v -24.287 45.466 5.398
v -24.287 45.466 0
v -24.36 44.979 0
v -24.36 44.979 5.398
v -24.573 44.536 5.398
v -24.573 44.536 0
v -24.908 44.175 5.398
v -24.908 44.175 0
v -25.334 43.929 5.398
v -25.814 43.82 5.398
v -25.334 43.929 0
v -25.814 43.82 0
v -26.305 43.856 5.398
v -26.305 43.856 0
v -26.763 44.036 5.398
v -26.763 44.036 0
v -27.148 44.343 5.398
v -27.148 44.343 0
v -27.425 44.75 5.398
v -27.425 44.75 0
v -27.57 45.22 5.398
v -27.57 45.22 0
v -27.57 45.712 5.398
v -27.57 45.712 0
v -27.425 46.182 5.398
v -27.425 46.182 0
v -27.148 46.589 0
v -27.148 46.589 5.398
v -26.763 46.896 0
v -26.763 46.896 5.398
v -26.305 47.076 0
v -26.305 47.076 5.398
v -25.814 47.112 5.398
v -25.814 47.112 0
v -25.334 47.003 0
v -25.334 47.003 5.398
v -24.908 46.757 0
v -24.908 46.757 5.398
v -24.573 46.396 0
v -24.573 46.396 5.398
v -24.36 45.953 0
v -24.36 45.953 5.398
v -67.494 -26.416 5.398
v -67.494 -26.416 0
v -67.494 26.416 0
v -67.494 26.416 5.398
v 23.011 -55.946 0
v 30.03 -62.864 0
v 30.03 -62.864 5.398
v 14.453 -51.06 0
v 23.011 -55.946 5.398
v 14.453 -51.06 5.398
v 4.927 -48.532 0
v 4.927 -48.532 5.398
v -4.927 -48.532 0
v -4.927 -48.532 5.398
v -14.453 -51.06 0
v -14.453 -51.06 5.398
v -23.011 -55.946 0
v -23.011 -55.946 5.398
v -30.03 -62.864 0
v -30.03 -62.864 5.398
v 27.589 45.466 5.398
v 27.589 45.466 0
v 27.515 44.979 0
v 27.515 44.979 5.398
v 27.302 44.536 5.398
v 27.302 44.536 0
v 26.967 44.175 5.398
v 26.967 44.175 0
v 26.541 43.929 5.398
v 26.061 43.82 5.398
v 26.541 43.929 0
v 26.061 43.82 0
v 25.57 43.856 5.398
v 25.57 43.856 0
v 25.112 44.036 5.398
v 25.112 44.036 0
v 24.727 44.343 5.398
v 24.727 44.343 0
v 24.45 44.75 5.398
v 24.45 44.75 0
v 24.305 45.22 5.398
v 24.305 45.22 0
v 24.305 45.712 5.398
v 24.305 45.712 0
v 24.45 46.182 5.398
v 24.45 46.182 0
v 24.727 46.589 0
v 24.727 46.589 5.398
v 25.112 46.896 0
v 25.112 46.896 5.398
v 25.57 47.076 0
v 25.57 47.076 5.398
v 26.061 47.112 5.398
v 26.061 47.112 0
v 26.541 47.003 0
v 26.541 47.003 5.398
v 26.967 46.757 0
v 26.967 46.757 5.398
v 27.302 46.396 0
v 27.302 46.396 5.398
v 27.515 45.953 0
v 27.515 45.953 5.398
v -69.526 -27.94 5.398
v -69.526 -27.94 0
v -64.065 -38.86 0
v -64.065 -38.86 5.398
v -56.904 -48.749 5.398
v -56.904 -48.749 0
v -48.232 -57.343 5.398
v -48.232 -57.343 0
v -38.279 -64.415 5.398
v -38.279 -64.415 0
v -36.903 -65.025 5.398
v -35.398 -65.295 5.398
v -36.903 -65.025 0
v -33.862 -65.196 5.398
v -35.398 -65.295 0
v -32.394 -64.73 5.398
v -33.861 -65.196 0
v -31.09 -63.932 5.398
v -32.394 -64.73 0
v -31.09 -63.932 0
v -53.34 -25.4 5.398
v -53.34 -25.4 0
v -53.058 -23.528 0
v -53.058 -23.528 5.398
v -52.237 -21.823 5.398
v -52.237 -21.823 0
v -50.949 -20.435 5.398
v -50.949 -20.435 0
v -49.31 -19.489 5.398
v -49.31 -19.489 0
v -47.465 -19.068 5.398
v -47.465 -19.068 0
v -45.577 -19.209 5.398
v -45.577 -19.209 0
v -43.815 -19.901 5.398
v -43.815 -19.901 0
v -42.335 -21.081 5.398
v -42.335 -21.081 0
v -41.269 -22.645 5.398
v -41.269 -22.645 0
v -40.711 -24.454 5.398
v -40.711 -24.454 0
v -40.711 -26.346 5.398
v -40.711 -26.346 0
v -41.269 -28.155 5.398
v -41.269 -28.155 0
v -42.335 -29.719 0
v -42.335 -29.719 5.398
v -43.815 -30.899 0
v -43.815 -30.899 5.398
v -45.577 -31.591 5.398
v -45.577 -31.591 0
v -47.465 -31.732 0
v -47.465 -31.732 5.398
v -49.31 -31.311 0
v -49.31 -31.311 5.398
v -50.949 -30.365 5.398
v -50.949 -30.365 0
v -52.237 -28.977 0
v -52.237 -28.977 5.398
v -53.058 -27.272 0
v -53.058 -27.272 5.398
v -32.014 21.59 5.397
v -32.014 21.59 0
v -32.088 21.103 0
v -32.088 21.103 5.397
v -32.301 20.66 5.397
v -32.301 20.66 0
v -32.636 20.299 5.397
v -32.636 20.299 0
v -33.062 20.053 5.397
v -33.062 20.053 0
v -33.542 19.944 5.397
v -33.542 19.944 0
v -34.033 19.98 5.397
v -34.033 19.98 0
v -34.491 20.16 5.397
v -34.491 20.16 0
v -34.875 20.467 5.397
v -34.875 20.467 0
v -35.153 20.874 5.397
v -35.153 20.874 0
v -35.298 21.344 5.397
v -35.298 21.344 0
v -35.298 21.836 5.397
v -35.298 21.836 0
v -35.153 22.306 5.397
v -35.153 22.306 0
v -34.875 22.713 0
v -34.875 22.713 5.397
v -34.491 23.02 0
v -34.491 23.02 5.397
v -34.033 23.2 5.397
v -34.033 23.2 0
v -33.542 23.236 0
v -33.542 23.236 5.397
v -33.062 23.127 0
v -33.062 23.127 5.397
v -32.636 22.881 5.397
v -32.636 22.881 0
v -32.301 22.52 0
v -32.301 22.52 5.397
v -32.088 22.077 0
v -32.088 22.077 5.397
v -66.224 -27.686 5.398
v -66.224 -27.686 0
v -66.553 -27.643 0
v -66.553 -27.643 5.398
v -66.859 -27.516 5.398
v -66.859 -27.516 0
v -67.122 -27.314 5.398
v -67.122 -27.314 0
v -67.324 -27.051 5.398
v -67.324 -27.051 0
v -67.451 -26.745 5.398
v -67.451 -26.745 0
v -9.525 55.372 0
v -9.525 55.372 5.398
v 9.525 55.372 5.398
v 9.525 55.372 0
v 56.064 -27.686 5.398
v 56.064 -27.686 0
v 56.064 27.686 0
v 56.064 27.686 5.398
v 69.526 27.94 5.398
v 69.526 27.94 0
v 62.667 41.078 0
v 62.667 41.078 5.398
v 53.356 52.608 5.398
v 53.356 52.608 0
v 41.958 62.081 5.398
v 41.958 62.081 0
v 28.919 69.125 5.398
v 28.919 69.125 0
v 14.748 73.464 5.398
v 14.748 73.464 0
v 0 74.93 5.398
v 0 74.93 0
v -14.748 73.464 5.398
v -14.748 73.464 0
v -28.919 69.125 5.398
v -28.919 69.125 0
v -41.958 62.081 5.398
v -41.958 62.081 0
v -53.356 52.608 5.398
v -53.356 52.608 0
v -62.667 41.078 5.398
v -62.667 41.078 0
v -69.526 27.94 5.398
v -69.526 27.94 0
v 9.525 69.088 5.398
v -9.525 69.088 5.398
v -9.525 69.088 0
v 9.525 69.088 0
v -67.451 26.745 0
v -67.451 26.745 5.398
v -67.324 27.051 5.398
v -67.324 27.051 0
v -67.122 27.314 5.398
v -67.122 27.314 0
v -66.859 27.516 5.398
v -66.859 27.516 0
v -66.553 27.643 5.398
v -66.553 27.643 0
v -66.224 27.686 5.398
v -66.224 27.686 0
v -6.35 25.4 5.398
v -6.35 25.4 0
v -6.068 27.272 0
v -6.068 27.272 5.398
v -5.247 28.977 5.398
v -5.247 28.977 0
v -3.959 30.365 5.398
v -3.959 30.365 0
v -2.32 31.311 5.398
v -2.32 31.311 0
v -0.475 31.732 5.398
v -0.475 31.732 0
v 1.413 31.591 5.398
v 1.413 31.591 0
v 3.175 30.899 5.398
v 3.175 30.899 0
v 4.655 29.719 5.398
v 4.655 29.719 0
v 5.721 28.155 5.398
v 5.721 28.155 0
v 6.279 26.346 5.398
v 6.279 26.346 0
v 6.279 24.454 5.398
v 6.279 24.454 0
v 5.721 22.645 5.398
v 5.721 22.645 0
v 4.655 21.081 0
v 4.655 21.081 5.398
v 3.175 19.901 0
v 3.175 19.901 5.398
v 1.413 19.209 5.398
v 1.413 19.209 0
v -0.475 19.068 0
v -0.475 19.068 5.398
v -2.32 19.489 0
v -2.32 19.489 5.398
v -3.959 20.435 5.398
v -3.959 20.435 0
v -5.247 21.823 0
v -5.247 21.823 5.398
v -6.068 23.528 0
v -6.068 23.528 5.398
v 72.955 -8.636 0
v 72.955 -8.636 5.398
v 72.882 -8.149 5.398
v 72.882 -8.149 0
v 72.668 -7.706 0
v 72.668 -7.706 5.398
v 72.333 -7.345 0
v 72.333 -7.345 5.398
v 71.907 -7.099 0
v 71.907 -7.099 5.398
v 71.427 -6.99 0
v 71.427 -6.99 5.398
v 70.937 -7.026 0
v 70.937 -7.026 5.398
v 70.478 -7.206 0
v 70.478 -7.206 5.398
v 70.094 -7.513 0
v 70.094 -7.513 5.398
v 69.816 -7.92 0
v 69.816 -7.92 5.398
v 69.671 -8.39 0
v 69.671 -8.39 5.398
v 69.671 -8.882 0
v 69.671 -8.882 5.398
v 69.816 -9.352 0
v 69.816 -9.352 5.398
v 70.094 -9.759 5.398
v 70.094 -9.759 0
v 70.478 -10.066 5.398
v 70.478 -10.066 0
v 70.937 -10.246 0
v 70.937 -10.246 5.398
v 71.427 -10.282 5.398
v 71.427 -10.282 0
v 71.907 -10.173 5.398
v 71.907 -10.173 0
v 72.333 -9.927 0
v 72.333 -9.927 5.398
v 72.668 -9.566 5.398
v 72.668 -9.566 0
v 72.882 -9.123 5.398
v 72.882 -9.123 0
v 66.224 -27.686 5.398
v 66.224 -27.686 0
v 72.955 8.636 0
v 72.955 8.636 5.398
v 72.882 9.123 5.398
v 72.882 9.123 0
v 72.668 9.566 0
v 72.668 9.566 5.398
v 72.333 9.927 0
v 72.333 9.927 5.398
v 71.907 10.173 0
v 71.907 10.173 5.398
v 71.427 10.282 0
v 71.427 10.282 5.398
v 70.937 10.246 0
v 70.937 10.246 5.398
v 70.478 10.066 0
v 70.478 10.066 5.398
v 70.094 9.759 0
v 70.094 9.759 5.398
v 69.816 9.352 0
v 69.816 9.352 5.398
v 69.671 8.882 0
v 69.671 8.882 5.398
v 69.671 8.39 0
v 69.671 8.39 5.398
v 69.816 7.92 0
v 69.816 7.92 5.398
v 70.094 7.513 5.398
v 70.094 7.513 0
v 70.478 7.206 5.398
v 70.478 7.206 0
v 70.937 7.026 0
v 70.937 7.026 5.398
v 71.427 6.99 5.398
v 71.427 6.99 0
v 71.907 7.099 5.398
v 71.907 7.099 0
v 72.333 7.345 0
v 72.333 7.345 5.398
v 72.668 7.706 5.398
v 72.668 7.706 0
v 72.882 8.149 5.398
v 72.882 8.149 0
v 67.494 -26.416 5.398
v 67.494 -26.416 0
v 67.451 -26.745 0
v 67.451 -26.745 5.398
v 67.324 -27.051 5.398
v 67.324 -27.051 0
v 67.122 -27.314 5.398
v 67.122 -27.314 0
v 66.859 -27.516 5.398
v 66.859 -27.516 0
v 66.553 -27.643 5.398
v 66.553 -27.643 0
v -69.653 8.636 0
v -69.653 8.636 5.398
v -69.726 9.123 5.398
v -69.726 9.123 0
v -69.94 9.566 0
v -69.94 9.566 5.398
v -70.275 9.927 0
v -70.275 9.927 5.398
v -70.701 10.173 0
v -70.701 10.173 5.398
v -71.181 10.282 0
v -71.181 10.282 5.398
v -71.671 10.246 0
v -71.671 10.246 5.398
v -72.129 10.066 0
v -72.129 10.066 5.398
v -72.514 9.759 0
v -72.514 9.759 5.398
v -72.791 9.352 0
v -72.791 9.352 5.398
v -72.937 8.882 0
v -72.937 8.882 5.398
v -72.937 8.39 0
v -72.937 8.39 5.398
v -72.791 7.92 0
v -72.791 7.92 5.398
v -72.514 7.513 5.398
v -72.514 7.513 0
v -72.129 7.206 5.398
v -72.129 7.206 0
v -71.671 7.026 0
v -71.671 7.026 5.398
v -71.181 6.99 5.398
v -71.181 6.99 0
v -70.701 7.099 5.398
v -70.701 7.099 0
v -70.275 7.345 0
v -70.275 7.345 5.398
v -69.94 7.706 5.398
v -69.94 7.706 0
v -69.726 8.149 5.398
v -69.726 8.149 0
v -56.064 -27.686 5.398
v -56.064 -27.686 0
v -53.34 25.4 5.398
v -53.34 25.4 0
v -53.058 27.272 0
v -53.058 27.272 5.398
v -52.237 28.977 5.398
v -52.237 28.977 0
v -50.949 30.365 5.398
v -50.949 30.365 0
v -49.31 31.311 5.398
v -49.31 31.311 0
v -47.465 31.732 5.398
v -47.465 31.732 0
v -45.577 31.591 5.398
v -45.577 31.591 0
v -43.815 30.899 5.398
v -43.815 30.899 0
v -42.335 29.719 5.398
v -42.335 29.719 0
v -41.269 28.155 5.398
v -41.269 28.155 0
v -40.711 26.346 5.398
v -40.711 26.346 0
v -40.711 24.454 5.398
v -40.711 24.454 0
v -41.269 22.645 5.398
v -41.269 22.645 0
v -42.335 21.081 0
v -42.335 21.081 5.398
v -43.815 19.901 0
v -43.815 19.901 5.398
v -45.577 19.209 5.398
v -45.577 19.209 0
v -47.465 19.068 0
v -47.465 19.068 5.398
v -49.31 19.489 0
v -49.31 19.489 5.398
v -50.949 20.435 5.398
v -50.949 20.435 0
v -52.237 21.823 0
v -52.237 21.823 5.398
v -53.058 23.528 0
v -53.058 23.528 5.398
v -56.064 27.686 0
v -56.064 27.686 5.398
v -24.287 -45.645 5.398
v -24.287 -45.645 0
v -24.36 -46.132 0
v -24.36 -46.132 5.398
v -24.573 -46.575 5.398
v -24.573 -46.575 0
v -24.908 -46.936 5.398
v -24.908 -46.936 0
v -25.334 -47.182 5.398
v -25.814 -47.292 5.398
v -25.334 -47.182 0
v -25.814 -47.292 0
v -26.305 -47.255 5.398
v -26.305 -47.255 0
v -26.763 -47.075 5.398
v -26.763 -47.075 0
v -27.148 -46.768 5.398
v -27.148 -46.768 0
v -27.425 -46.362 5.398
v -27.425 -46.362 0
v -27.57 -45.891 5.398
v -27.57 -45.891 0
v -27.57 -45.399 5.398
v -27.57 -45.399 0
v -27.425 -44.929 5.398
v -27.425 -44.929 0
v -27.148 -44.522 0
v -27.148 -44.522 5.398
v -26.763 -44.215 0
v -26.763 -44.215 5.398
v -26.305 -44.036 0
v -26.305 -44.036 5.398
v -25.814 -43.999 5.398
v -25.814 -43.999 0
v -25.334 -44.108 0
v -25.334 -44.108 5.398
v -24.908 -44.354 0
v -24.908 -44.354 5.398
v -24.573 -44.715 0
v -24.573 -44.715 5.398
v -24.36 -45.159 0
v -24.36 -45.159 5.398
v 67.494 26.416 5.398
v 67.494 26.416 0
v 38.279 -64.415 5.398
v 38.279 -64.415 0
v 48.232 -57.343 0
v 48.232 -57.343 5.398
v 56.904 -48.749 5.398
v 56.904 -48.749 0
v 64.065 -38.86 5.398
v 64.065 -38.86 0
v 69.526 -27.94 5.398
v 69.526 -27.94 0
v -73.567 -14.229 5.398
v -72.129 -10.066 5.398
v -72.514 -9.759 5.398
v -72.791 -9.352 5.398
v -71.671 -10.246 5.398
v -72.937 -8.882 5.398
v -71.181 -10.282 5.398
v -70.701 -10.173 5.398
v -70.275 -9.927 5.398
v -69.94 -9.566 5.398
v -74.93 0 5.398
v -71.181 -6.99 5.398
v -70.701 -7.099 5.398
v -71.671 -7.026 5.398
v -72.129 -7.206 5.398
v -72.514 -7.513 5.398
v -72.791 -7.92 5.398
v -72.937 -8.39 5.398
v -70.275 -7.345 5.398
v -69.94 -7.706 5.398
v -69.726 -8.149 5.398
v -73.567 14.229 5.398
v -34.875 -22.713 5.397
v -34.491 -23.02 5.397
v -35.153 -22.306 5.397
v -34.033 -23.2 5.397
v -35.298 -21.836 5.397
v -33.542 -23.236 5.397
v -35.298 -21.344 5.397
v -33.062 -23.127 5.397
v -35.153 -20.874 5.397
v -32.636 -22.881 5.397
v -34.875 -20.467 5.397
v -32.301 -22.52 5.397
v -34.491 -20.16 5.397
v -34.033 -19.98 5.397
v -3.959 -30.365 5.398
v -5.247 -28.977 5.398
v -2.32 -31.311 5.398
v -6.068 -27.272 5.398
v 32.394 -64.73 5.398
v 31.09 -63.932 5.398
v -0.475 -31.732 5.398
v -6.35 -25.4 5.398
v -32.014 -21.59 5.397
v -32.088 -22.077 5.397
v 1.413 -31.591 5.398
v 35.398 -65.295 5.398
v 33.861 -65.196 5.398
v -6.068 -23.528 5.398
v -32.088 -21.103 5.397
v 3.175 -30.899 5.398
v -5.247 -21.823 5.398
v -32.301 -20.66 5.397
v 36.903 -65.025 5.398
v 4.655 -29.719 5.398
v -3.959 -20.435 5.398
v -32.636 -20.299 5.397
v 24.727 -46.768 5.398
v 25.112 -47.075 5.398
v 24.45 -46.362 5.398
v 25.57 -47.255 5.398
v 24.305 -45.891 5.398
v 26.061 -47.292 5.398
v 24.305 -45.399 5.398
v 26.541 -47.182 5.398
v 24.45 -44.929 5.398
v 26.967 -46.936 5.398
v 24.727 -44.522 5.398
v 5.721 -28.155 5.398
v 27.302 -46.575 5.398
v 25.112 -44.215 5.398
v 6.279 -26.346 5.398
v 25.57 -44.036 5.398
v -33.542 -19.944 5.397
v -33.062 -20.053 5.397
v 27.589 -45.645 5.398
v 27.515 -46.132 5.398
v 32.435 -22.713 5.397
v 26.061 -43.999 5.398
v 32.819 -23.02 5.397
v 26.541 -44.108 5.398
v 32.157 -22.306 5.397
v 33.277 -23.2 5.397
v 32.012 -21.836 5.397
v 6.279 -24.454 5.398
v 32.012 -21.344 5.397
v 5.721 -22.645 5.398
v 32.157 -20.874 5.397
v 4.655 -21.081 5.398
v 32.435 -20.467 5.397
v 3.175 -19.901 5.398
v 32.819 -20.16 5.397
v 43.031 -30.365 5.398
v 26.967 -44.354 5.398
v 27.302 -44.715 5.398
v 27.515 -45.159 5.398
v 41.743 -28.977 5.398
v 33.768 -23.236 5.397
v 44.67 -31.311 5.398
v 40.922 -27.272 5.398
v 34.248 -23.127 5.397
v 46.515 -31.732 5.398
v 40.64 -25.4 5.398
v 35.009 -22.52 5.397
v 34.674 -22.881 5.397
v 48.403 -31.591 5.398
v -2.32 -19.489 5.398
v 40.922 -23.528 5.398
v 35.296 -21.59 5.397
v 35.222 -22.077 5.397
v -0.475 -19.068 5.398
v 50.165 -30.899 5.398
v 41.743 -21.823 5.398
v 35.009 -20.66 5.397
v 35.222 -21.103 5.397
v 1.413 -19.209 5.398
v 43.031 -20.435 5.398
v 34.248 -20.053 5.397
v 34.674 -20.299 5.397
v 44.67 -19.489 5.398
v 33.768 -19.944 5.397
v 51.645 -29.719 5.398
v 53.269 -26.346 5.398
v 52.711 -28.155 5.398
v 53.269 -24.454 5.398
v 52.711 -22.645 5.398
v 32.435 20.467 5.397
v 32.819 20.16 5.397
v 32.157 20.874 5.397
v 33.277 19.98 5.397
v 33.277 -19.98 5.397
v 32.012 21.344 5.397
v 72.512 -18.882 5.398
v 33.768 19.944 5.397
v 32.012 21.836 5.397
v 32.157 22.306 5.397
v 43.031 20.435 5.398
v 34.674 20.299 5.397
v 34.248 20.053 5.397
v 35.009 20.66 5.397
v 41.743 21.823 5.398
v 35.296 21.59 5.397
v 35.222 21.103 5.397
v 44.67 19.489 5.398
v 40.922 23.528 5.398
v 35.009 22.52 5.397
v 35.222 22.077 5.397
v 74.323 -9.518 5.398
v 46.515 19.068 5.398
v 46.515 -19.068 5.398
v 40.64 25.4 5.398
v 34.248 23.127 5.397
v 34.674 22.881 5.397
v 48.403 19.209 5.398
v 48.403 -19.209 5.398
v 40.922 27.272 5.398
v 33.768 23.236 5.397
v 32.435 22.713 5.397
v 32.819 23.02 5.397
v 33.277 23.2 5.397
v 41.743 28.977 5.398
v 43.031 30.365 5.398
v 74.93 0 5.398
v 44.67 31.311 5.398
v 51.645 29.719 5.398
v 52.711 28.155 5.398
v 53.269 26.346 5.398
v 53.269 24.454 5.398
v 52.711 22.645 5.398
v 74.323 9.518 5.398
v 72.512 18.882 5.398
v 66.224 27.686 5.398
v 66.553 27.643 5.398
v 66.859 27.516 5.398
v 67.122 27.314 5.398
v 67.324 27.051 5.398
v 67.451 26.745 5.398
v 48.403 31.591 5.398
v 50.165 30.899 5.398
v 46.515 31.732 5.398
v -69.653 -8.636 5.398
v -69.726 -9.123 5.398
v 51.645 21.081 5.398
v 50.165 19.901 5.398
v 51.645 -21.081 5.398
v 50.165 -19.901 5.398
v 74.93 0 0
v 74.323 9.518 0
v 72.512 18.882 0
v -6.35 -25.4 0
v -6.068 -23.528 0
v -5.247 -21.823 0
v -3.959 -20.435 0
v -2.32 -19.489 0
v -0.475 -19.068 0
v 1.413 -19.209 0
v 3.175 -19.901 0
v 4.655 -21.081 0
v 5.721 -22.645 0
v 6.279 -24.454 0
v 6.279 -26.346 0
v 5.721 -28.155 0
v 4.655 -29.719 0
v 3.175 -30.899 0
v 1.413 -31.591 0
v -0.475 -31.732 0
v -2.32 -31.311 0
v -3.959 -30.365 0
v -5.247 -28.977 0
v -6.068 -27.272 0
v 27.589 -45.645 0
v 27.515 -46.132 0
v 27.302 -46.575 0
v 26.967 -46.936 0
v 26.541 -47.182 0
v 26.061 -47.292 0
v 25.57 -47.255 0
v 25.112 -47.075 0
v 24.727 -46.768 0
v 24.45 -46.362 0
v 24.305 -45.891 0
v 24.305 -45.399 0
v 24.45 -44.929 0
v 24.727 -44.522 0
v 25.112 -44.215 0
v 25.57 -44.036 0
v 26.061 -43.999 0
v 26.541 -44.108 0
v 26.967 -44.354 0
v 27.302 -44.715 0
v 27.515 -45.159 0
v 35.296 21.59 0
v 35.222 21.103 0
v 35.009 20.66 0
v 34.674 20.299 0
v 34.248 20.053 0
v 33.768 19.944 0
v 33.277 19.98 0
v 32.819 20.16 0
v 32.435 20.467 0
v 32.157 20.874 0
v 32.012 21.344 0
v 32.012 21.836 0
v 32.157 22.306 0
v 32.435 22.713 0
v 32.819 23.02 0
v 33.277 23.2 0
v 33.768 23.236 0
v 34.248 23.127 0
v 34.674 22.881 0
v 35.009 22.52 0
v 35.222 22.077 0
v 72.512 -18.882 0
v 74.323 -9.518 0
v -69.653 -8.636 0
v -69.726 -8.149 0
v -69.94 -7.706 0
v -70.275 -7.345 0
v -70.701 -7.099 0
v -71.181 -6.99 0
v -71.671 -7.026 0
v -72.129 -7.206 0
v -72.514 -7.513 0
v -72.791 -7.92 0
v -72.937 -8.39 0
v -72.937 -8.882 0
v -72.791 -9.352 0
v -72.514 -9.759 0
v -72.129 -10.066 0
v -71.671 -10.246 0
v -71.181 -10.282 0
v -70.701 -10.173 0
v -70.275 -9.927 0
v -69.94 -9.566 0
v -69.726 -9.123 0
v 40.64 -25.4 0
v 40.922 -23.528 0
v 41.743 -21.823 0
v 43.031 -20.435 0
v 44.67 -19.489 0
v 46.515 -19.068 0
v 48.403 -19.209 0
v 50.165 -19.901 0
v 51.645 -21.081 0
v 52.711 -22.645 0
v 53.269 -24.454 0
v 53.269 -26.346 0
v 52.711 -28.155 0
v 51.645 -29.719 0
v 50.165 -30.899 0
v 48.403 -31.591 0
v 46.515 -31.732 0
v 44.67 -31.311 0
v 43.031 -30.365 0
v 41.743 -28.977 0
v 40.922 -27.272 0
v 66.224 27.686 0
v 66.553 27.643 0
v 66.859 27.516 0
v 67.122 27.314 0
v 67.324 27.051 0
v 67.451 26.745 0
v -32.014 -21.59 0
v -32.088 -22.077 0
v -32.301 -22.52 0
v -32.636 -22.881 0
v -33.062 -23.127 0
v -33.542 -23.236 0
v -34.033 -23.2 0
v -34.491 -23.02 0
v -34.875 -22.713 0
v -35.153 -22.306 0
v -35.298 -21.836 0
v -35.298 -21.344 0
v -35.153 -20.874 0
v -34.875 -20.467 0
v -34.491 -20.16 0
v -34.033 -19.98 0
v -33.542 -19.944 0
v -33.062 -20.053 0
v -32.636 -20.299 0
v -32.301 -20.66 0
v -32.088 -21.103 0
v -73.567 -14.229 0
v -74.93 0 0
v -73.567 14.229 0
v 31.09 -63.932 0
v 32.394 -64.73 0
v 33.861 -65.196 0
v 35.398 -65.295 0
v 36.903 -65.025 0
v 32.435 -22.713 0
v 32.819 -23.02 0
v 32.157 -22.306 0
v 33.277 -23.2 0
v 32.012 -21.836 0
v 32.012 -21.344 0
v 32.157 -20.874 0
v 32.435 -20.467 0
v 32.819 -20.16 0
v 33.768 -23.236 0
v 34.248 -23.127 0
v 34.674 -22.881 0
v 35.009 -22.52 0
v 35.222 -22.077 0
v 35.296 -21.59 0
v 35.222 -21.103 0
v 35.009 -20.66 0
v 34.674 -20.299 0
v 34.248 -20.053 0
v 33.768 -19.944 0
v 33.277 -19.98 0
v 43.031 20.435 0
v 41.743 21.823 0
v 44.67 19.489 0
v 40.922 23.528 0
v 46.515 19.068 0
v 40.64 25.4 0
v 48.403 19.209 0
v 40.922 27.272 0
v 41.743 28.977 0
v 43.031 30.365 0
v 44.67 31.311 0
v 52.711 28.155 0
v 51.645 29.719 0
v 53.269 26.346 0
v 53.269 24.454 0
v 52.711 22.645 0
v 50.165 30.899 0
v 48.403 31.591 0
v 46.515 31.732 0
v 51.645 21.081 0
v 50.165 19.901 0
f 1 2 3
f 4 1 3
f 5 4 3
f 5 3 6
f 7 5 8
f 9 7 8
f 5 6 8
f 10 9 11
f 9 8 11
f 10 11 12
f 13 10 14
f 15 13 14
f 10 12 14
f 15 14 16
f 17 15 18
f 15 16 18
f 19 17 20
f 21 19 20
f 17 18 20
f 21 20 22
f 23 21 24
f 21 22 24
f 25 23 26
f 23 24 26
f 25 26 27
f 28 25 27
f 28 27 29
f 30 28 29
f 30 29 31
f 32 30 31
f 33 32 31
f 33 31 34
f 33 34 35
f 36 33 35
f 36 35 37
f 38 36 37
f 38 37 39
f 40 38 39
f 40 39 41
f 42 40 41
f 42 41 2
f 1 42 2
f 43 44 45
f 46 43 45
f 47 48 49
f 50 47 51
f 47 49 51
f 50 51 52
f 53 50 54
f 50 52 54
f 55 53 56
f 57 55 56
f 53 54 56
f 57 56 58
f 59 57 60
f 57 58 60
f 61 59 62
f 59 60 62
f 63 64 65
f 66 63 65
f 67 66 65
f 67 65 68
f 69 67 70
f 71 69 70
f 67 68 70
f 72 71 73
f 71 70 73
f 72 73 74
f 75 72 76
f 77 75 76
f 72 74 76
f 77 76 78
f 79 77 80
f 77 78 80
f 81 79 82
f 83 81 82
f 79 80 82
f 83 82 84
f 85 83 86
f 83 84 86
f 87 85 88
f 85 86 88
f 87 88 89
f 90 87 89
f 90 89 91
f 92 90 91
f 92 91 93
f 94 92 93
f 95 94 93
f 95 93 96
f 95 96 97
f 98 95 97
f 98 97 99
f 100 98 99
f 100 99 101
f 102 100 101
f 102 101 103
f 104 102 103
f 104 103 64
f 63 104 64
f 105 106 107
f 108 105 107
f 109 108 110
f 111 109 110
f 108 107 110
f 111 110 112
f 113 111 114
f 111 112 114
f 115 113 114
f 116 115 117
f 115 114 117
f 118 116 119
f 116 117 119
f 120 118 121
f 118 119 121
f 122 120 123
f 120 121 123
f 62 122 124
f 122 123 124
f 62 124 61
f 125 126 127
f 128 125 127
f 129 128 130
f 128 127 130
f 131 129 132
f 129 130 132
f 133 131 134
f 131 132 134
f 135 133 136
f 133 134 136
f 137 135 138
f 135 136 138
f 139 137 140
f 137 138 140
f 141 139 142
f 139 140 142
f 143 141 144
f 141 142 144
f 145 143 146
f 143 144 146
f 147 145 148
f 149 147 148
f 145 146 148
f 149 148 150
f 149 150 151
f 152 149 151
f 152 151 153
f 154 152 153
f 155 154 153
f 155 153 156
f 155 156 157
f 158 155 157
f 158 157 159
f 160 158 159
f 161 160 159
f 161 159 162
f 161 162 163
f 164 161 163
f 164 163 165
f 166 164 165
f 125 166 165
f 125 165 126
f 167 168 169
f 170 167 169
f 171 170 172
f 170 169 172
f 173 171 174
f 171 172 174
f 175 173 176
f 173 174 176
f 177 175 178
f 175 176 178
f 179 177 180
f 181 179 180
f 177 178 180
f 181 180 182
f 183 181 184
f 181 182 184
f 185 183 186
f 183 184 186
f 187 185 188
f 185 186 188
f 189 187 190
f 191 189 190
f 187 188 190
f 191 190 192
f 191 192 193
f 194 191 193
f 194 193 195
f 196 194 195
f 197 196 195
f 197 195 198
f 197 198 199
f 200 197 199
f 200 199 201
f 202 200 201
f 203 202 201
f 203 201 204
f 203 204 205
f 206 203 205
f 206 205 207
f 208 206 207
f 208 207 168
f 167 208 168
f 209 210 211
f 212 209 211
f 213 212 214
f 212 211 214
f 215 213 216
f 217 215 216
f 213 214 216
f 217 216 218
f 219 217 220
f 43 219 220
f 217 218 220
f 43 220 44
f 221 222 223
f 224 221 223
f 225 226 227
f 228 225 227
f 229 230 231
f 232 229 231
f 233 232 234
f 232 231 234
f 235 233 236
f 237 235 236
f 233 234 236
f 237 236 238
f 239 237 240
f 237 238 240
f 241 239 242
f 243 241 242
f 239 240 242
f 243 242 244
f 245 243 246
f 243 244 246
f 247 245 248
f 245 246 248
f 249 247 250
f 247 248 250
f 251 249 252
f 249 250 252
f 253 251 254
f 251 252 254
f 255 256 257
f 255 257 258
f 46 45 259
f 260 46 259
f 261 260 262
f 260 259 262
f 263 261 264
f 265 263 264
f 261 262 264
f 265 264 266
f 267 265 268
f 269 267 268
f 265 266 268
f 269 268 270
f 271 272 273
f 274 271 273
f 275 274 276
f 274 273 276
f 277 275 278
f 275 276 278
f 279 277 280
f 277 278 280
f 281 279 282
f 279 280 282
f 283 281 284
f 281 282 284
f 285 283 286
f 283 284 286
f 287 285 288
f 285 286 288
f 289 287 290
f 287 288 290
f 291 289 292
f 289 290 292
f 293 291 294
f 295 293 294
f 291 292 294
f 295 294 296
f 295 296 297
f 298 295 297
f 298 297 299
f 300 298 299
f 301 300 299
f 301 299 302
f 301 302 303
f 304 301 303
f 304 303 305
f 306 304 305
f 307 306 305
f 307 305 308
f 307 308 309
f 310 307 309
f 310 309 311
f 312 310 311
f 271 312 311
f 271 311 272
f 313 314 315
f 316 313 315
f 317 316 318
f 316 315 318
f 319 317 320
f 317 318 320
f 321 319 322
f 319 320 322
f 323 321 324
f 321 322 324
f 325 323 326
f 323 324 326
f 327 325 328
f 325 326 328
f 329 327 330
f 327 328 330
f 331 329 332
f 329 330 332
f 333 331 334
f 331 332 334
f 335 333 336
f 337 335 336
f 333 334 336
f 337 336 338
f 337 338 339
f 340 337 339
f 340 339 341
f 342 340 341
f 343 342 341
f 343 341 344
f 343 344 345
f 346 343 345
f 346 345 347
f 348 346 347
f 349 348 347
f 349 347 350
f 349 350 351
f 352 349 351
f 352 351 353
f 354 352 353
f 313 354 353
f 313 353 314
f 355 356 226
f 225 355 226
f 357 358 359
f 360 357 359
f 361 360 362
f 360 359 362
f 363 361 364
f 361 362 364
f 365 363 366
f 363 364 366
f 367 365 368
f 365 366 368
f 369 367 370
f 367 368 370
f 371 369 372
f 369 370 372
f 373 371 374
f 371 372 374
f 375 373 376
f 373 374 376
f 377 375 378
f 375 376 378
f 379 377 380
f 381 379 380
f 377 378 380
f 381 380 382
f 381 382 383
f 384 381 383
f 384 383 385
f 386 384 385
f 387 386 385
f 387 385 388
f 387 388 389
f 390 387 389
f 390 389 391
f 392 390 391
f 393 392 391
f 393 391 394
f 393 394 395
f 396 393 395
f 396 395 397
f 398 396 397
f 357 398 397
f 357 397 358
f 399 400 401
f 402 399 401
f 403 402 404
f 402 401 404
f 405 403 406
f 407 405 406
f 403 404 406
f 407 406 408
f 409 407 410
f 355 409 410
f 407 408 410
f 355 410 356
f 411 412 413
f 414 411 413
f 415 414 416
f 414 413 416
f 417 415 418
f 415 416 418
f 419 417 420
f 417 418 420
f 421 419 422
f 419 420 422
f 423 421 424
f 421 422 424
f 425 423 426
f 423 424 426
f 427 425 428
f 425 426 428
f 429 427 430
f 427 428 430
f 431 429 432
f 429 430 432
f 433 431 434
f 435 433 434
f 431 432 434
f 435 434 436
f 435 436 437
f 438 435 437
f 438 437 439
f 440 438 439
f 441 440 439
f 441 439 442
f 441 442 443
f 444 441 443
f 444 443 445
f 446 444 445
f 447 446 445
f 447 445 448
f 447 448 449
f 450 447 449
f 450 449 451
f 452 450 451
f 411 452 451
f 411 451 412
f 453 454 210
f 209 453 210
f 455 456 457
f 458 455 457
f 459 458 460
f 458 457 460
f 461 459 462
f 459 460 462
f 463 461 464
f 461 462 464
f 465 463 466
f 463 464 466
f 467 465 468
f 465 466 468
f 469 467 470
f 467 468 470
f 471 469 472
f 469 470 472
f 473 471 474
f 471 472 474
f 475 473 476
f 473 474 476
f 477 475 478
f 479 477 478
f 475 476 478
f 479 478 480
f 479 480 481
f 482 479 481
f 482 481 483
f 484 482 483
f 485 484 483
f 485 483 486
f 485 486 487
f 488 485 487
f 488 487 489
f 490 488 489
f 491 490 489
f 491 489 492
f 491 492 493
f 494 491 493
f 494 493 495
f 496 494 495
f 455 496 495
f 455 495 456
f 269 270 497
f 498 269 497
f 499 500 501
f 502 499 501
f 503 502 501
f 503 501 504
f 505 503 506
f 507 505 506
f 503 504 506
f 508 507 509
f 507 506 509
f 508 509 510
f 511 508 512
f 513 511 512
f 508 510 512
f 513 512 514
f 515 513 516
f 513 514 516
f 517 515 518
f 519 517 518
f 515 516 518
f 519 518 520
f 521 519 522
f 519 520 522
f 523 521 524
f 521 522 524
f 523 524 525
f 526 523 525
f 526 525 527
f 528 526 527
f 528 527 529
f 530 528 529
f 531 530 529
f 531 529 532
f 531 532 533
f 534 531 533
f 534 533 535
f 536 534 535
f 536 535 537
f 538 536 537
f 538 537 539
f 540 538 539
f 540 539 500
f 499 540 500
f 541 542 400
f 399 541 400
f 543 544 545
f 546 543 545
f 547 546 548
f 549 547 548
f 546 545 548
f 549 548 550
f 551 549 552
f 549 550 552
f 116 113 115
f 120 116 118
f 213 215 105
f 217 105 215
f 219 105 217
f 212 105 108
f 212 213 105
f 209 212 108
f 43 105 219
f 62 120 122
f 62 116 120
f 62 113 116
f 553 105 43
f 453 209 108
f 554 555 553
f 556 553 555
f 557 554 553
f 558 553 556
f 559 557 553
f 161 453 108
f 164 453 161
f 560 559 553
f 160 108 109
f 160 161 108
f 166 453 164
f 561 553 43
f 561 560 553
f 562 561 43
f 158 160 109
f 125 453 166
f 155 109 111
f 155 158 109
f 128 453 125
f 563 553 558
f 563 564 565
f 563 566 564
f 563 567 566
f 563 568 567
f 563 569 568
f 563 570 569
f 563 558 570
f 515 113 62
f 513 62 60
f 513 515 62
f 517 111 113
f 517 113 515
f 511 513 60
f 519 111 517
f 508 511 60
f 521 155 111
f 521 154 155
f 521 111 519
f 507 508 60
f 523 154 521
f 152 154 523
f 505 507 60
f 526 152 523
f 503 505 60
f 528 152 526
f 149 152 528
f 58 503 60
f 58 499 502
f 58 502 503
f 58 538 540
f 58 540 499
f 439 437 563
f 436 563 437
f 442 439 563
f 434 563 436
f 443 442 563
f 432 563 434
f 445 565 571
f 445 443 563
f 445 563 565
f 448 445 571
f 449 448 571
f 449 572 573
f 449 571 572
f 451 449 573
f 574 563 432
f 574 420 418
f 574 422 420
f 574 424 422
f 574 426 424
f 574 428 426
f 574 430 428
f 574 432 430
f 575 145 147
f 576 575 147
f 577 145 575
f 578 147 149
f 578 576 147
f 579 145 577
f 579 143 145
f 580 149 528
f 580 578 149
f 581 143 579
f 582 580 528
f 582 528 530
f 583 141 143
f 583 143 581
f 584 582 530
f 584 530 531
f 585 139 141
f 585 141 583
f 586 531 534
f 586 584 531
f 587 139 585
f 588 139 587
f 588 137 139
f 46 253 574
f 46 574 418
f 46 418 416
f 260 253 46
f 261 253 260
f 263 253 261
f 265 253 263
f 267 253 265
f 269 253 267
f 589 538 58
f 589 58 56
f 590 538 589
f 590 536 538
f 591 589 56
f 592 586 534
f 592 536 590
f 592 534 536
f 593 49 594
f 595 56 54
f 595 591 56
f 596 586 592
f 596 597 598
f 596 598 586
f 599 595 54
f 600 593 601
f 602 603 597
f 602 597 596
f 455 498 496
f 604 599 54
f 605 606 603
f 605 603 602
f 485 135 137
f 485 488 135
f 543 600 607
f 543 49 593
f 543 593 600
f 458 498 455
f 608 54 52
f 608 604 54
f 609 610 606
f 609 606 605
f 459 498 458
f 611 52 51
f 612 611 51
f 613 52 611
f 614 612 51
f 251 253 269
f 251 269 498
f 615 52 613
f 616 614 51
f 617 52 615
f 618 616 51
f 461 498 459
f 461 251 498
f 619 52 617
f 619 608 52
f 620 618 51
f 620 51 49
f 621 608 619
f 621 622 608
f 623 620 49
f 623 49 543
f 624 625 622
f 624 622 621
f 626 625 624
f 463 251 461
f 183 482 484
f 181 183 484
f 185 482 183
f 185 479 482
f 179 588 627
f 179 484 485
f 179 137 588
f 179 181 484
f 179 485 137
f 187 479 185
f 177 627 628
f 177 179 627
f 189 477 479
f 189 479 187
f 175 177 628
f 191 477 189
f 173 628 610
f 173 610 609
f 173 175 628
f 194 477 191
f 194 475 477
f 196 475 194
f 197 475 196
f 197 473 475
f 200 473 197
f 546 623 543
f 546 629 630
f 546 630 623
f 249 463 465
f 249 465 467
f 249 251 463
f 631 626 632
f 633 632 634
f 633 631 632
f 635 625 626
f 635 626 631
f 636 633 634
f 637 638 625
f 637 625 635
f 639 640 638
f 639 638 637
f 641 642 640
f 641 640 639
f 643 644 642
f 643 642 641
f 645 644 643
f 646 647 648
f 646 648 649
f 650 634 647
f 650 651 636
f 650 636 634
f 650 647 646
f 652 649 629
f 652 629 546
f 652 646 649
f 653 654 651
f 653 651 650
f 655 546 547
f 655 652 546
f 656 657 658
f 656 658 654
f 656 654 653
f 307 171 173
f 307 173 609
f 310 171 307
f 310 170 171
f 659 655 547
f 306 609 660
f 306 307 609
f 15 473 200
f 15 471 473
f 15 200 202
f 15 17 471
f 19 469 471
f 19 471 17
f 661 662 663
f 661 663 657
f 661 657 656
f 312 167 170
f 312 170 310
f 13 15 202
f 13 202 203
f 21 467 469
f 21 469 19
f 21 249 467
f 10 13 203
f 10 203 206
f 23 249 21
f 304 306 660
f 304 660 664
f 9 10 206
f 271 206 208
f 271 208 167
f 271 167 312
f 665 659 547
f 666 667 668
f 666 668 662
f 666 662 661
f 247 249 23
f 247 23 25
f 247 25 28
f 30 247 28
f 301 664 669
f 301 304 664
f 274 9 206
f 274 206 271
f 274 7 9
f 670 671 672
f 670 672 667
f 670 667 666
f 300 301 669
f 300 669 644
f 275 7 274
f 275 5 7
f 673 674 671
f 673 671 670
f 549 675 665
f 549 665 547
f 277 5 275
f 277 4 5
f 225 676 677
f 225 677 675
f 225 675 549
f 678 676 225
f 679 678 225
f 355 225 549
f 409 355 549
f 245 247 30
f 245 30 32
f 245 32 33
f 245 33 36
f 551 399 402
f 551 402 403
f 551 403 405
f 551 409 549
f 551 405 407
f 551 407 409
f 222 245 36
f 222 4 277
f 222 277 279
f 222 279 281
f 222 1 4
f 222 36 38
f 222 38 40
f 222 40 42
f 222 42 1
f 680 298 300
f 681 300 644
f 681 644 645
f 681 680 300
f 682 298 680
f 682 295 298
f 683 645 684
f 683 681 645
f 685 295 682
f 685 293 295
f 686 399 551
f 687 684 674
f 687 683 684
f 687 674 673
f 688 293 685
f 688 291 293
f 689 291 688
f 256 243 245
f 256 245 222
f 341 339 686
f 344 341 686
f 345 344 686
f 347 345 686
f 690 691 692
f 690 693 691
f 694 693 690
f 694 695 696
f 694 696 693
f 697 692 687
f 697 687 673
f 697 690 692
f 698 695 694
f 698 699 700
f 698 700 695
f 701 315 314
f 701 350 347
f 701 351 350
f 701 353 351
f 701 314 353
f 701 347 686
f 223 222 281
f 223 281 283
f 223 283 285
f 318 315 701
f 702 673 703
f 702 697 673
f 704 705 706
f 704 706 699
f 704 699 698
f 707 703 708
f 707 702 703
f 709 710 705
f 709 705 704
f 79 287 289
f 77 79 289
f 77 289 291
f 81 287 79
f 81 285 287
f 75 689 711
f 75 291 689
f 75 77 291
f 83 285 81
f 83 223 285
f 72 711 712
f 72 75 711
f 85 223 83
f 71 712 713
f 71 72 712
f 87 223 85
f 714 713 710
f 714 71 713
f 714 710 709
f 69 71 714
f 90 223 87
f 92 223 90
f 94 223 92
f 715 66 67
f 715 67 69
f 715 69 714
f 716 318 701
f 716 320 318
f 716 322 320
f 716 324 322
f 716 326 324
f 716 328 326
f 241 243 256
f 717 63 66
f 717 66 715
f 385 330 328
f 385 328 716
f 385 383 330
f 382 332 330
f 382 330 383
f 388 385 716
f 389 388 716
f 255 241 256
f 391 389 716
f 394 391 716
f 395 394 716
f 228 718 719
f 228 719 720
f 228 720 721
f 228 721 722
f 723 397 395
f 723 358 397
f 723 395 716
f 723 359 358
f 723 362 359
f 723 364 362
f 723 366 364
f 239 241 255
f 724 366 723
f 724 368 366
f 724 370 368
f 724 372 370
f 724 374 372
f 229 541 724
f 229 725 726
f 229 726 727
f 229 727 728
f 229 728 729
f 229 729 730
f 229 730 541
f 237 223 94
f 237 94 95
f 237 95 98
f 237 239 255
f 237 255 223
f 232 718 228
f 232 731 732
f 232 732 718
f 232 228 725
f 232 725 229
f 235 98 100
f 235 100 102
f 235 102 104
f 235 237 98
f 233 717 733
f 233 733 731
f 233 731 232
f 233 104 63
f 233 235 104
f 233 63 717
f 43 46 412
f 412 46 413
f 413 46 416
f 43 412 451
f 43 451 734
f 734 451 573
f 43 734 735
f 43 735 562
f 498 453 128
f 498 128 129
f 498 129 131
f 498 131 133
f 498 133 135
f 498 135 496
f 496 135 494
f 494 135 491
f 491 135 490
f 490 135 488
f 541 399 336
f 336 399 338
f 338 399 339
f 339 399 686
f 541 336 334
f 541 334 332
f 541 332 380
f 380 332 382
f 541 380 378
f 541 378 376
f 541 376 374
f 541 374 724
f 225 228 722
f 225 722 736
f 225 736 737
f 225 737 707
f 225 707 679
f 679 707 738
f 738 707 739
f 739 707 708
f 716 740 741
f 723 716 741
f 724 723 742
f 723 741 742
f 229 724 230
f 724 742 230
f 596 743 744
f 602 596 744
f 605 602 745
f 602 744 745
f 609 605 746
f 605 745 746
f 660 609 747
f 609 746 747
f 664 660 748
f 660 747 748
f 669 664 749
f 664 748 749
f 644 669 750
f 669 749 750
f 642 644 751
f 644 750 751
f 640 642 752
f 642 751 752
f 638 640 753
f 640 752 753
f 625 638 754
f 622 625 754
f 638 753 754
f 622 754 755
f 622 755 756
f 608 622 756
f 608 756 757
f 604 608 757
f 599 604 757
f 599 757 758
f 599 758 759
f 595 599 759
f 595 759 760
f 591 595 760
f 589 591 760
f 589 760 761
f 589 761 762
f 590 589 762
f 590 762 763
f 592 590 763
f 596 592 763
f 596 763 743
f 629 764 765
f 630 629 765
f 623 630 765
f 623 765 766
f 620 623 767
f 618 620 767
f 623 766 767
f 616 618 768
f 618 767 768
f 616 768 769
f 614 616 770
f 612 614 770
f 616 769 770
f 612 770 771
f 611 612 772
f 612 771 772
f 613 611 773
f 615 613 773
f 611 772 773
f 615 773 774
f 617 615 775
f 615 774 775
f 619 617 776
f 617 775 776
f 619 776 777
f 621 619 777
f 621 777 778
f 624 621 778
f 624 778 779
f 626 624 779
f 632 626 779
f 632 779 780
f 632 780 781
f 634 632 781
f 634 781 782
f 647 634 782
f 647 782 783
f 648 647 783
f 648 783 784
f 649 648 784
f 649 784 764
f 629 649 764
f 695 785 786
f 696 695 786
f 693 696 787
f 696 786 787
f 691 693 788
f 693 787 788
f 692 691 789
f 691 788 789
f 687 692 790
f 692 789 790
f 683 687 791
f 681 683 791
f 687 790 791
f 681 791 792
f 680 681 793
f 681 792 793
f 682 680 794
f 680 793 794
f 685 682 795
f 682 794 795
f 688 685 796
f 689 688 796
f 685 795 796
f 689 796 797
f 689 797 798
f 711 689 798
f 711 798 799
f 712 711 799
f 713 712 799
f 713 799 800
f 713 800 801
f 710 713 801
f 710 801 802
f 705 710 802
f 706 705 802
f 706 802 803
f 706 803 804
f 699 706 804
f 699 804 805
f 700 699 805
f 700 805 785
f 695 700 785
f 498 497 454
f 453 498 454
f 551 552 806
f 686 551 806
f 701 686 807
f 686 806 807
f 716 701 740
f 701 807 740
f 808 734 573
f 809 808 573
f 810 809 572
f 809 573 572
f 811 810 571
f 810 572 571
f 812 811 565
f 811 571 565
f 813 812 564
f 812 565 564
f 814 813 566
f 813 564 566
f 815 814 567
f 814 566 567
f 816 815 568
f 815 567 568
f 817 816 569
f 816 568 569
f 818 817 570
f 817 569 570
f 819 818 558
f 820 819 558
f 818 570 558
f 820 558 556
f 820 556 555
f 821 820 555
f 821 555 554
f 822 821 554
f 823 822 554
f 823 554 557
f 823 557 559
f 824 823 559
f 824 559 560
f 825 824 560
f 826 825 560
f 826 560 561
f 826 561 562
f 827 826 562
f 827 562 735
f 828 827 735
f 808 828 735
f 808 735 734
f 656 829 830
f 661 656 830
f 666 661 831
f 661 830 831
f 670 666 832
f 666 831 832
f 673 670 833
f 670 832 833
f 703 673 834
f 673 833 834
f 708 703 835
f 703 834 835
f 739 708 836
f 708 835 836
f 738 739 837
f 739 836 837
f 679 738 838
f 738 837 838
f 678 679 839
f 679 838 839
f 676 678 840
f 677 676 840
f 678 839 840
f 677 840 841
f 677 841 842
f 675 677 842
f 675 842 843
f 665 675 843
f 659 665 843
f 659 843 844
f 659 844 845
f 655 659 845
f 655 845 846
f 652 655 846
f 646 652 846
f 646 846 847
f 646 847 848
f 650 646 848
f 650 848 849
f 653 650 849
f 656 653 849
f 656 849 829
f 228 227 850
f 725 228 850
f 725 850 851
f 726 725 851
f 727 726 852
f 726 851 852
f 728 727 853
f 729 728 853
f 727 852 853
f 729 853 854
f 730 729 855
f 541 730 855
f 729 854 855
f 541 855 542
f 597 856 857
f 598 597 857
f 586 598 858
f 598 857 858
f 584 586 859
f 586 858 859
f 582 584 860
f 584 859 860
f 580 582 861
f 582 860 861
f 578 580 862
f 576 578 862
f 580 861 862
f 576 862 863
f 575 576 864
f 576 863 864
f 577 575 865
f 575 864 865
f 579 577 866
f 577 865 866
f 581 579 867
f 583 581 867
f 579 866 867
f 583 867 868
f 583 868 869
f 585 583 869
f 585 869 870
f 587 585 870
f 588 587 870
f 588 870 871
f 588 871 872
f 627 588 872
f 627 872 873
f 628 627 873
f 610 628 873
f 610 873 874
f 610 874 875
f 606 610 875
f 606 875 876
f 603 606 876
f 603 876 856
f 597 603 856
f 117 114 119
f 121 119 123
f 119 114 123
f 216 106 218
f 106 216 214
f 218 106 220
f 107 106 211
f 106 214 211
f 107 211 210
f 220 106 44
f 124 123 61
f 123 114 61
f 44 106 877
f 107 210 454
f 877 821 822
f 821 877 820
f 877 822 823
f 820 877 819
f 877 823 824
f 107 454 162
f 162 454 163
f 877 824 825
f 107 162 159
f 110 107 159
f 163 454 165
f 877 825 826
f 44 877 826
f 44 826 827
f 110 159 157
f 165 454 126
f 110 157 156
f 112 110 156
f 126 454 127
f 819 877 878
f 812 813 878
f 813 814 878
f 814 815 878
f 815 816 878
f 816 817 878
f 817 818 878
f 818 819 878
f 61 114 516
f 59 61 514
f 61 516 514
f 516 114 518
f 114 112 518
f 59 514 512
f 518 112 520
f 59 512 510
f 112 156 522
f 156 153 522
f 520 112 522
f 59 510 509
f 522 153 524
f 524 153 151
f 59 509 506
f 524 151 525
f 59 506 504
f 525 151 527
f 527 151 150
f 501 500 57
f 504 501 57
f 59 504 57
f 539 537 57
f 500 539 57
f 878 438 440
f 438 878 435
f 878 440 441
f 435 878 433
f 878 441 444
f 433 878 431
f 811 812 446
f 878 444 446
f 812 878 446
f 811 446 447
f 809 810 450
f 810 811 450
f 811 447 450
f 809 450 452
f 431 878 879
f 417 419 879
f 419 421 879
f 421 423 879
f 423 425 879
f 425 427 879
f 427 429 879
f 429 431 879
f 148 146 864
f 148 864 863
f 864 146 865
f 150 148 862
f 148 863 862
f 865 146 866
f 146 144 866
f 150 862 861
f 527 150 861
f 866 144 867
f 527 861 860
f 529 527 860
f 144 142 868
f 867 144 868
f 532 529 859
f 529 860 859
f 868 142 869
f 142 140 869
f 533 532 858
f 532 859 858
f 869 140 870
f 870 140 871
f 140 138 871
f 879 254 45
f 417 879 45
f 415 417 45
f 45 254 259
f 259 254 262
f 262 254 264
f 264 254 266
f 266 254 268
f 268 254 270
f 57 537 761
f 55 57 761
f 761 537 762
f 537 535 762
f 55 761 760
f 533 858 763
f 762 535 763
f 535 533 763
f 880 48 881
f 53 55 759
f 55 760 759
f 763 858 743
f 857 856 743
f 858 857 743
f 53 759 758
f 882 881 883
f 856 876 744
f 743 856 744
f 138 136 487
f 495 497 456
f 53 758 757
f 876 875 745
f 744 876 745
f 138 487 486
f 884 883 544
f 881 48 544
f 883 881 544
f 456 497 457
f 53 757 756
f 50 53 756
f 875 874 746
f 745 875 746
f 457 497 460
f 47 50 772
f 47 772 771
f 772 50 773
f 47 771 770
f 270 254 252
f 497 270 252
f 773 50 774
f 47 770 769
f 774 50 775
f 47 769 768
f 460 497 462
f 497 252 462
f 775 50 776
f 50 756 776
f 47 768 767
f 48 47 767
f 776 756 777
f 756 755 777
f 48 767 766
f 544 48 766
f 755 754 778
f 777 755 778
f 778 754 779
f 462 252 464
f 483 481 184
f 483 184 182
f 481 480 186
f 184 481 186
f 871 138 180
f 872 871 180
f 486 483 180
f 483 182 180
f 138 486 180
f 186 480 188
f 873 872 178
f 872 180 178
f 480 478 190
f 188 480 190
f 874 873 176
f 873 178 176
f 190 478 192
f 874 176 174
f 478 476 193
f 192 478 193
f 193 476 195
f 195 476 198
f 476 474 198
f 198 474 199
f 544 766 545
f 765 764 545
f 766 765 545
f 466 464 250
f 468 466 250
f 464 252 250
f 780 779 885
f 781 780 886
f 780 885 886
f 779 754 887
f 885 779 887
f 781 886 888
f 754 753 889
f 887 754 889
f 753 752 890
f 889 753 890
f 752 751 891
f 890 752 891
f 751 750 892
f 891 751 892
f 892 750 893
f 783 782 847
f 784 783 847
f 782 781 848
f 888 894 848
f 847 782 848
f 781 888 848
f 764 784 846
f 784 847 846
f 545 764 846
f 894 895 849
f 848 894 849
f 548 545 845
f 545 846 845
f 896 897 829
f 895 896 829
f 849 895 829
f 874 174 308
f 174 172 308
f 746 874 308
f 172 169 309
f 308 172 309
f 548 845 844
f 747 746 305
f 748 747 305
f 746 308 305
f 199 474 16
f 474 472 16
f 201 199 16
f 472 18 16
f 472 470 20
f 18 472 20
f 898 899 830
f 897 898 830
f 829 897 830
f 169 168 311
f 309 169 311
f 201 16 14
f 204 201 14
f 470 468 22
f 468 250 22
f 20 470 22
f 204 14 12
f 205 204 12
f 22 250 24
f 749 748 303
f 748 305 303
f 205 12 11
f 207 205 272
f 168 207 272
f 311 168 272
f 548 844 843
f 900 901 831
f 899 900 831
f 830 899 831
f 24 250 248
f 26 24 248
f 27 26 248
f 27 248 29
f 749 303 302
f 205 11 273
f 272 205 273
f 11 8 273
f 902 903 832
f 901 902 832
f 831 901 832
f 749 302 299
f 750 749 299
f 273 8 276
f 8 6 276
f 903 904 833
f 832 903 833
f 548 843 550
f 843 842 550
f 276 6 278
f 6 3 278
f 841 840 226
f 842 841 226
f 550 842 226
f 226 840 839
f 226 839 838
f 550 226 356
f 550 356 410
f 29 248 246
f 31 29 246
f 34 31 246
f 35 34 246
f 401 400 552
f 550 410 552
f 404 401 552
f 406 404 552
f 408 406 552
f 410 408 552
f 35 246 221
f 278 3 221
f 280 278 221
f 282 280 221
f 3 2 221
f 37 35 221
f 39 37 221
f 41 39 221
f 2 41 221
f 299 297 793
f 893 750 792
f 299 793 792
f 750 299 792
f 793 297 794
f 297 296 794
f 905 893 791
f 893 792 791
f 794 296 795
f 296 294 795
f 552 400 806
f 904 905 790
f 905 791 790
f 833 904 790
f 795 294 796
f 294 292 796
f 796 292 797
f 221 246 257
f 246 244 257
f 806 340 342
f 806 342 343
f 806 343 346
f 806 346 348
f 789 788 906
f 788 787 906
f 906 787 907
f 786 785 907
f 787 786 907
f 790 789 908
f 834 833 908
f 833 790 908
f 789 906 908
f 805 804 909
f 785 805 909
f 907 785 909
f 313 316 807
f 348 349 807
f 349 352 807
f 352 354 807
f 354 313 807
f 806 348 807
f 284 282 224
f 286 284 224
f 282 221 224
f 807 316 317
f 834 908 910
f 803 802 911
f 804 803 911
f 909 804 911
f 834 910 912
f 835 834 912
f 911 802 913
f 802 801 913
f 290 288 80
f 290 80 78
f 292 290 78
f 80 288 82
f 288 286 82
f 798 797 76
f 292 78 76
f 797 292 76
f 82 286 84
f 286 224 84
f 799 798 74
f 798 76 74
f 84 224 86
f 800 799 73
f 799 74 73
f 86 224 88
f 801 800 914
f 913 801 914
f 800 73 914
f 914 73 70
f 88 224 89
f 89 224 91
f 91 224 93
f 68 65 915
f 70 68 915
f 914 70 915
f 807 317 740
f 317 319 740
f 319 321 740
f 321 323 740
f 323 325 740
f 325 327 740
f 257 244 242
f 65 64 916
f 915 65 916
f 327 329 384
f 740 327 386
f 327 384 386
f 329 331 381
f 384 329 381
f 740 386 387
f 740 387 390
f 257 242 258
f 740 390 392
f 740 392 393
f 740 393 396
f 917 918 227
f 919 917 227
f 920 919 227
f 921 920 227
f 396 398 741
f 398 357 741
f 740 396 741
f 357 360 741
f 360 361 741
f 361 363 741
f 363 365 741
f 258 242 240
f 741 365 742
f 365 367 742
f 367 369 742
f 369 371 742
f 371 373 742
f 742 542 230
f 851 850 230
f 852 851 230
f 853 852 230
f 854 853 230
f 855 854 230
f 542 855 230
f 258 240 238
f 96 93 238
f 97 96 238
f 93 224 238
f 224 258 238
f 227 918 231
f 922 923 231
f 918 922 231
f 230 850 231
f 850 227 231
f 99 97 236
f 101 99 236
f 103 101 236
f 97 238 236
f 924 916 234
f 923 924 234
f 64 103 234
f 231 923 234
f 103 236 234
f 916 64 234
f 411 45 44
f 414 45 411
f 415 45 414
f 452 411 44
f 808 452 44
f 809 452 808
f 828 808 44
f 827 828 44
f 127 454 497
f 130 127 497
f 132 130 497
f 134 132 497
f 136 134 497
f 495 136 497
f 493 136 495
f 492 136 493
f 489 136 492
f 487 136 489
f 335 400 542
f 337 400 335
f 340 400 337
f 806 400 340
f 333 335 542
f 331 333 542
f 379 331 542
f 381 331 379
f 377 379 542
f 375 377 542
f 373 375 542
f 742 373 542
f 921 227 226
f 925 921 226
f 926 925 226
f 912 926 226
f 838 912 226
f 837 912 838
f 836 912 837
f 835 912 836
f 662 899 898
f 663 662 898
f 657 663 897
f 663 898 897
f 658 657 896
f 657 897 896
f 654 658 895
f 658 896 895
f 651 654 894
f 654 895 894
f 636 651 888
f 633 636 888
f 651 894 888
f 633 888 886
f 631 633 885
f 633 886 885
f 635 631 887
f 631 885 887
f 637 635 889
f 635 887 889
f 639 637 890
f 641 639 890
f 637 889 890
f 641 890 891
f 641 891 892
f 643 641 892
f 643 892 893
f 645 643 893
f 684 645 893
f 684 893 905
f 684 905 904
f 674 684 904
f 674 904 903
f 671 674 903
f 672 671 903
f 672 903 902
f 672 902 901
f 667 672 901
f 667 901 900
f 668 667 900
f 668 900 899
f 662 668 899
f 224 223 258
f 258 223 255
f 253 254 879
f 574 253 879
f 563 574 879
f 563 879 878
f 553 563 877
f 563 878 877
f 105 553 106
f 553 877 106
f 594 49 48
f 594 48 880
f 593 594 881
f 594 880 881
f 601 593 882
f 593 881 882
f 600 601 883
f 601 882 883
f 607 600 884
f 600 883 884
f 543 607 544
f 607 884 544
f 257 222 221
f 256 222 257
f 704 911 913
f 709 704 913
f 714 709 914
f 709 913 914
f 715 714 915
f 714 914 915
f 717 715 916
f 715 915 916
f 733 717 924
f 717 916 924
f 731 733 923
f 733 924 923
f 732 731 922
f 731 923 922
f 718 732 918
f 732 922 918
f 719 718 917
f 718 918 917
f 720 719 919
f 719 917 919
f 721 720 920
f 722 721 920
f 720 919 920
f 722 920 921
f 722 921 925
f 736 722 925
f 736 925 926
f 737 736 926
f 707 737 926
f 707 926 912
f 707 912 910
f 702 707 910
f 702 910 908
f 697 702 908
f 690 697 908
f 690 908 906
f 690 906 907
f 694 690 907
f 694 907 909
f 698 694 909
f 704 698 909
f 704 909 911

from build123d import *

# Parameters (mm, degrees)
BOSS_EXTRUDE2_DEPTH      = 5.3975
SKETCH2_W                = 19.05
SKETCH2_H                = 13.716
CUT_EXTRUDE1_DEPTH       = 107.104395791
SKETCH3_R                = 38.1
CUT_EXTRUDE2_DEPTH       = 107.104395791
FILLET1_R                = 6.35
SKETCH8_R                = 1.651
CUT_EXTRUDE7_DEPTH       = 75.692
SKETCH10_R               = 1.651
CUT_EXTRUDE9_DEPTH       = 97.79
SKETCH11_R               = 1.651
CUT_EXTRUDE10_DEPTH      = 150.876
SKETCH12_R               = 3.175
CUT_EXTRUDE11_DEPTH      = 103.378
CUT_EXTRUDE11_DEPTH_BACK = 48.768
SKETCH13_R               = 6.35
CUT_EXTRUDE12_DEPTH      = 26.416


with BuildPart() as part:
    # Sketch1 → Boss-Extrude2 (new body)
    with BuildSketch(Plane.XY):
        with BuildLine():
            ThreePointArc((-69.525975721, 27.94), (-74.93, 0), (-69.525975721, -27.94))
            ThreePointArc((-69.525975721, -27.94), (0, -74.93), (69.525975721, -27.94))
            ThreePointArc((69.525975721, -27.94), (73.56658977, -14.228906128), (74.93, 0))
            ThreePointArc((74.93, 0), (73.56658977, 14.228906128), (69.525975721, 27.94))
            ThreePointArc((69.525975721, 27.94), (0, 74.93), (-69.525975721, 27.94))
        make_face()
        with BuildLine():
            ThreePointArc((-67.493975721, 26.416), (-67.122001333, 27.314025612), (-66.223975721, 27.686))
            Line((-66.223975721, 27.686), (-56.063975721, 27.686))
            Line((-56.063975721, 27.686), (-56.063975721, -27.686))
            Line((-56.063975721, -27.686), (-66.223975721, -27.686))
            ThreePointArc((-66.223975721, -27.686), (-67.122001333, -27.314025612), (-67.493975721, -26.416))
            Line((-67.493975721, -26.416), (-67.493975721, 26.416))
        make_face(mode=Mode.SUBTRACT)
        with BuildLine():
            ThreePointArc((66.223975721, 27.686), (67.122001333, 27.314025612), (67.493975721, 26.416))
            Line((67.493975721, 26.416), (67.493975721, -26.416))
            ThreePointArc((67.493975721, -26.416), (67.122001333, -27.314025612), (66.223975721, -27.686))
            Line((66.223975721, -27.686), (56.063975721, -27.686))
            Line((56.063975721, -27.686), (56.063975721, 27.686))
            Line((56.063975721, 27.686), (66.223975721, 27.686))
        make_face(mode=Mode.SUBTRACT)
    extrude(amount=BOSS_EXTRUDE2_DEPTH)

    # Sketch2 → Cut-Extrude1 (cut, through all)
    with BuildSketch(Plane.XY.offset(5.3975)):
        with Locations((0, 62.23)):
            Rectangle(SKETCH2_W, SKETCH2_H)
    extrude(amount=-CUT_EXTRUDE1_DEPTH, mode=Mode.SUBTRACT)

    # Sketch3 → Cut-Extrude2 (cut, through all)
    with BuildSketch(Plane.XY.offset(5.3975)):
        with Locations((0, -86.312058398)):
            Circle(SKETCH3_R)
    extrude(amount=-CUT_EXTRUDE2_DEPTH, mode=Mode.SUBTRACT)

    # Fillet1
    fillet1_edges = [part.edges().sort_by_distance(p)[0] for p in [
        (-33.000960548, -67.271401821, 2.69875),
        (33.000960548, -67.271401821, 2.69875),
    ]]
    fillet(fillet1_edges, radius=FILLET1_R)

    # Sketch8 → Cut-Extrude7 (cut)
    with BuildSketch(Plane(origin=(30.092005081, 4.08352975, -11.4935), x_dir=(-1, 0, 0), z_dir=(0, 0, -1))):
        with Locations(Location((63.757223581, 17.50647025, 0), (0, 0, 180))):
            Circle(SKETCH8_R)
        with Locations(Location((63.757223581, -25.67352975, 0), (0, 0, 180))):
            Circle(SKETCH8_R)
        with Locations(Location((-3.552776419, -25.67352975, 0), (0, 0, 180))):
            Circle(SKETCH8_R)
        with Locations(Location((-3.552776419, 17.50647025, 0), (0, 0, 180))):
            Circle(SKETCH8_R)
    extrude(amount=-CUT_EXTRUDE7_DEPTH, mode=Mode.SUBTRACT)

    # Sketch10 → Cut-Extrude9 (cut)
    with BuildSketch(Plane(origin=(30.092005081, 4.08352975, -41.529), x_dir=(-1, 0, 0), z_dir=(0, 0, -1))):
        with Locations(Location((4.154396091, -49.728759131, 0), (0, 0, 180))):
            Circle(SKETCH10_R)
        with Locations(Location((56.02961407, -49.728759131, 0), (0, 0, 180))):
            Circle(SKETCH10_R)
        with Locations(Location((4.154396091, 41.38247025, 0), (0, 0, 180))):
            Circle(SKETCH10_R)
        with Locations(Location((56.02961407, 41.38247025, 0), (0, 0, 180))):
            Circle(SKETCH10_R)
    extrude(amount=-CUT_EXTRUDE9_DEPTH, mode=Mode.SUBTRACT)

    # Sketch11 → Cut-Extrude10 (cut)
    with BuildSketch(Plane(origin=(30.092005081, 4.08352975, 5.3975), x_dir=(1, 0, 0), z_dir=(0, 0, 1))):
        with Locations((-101.395980802, -12.71952975)):
            Circle(SKETCH11_R)
        with Locations((-101.395980802, 4.55247025)):
            Circle(SKETCH11_R)
        with Locations((41.211970641, -12.71952975)):
            Circle(SKETCH11_R)
        with Locations((41.211970641, 4.55247025)):
            Circle(SKETCH11_R)
    extrude(amount=-CUT_EXTRUDE10_DEPTH, mode=Mode.SUBTRACT)

    # Sketch12 → Cut-Extrude11 (cut, two sides)
    with BuildSketch(Plane(origin=(30.092005081, 4.08352975, -5.3975), x_dir=(-1, 0, 0), z_dir=(0, 0, -1))) as cut_extrude11_sk:
        with Locations(Location((-16.897994919, 21.31647025, 0), (0, 0, 180))):
            Circle(SKETCH12_R)
        with Locations(Location((77.082005081, 21.31647025, 0), (0, 0, 180))):
            Circle(SKETCH12_R)
        with Locations(Location((30.092005081, 21.31647025, 0), (0, 0, 180))):
            Circle(SKETCH12_R)
        with Locations(Location((77.082005081, -29.48352975, 0), (0, 0, 180))):
            Circle(SKETCH12_R)
        with Locations(Location((30.092005081, -29.48352975, 0), (0, 0, 180))):
            Circle(SKETCH12_R)
        with Locations(Location((-16.897994919, -29.48352975, 0), (0, 0, 180))):
            Circle(SKETCH12_R)
    extrude(amount=CUT_EXTRUDE11_DEPTH, mode=Mode.SUBTRACT)
    extrude(cut_extrude11_sk.sketch, amount=-CUT_EXTRUDE11_DEPTH_BACK, mode=Mode.SUBTRACT)

    # Sketch13 → Cut-Extrude12 (cut)
    with BuildSketch(Plane(origin=(0, 0, 0), x_dir=(-1, 0, 0), z_dir=(0, 0, -1))):
        with Locations((46.99, 25.4)):
            Circle(SKETCH13_R)
        with Locations((0, 25.4)):
            Circle(SKETCH13_R)
        with Locations((-46.99, 25.4)):
            Circle(SKETCH13_R)
        with Locations((-46.99, -25.4)):
            Circle(SKETCH13_R)
        with Locations((0, -25.4)):
            Circle(SKETCH13_R)
        with Locations((46.99, -25.4)):
            Circle(SKETCH13_R)
    extrude(amount=-CUT_EXTRUDE12_DEPTH, mode=Mode.SUBTRACT)


solid = part.part
